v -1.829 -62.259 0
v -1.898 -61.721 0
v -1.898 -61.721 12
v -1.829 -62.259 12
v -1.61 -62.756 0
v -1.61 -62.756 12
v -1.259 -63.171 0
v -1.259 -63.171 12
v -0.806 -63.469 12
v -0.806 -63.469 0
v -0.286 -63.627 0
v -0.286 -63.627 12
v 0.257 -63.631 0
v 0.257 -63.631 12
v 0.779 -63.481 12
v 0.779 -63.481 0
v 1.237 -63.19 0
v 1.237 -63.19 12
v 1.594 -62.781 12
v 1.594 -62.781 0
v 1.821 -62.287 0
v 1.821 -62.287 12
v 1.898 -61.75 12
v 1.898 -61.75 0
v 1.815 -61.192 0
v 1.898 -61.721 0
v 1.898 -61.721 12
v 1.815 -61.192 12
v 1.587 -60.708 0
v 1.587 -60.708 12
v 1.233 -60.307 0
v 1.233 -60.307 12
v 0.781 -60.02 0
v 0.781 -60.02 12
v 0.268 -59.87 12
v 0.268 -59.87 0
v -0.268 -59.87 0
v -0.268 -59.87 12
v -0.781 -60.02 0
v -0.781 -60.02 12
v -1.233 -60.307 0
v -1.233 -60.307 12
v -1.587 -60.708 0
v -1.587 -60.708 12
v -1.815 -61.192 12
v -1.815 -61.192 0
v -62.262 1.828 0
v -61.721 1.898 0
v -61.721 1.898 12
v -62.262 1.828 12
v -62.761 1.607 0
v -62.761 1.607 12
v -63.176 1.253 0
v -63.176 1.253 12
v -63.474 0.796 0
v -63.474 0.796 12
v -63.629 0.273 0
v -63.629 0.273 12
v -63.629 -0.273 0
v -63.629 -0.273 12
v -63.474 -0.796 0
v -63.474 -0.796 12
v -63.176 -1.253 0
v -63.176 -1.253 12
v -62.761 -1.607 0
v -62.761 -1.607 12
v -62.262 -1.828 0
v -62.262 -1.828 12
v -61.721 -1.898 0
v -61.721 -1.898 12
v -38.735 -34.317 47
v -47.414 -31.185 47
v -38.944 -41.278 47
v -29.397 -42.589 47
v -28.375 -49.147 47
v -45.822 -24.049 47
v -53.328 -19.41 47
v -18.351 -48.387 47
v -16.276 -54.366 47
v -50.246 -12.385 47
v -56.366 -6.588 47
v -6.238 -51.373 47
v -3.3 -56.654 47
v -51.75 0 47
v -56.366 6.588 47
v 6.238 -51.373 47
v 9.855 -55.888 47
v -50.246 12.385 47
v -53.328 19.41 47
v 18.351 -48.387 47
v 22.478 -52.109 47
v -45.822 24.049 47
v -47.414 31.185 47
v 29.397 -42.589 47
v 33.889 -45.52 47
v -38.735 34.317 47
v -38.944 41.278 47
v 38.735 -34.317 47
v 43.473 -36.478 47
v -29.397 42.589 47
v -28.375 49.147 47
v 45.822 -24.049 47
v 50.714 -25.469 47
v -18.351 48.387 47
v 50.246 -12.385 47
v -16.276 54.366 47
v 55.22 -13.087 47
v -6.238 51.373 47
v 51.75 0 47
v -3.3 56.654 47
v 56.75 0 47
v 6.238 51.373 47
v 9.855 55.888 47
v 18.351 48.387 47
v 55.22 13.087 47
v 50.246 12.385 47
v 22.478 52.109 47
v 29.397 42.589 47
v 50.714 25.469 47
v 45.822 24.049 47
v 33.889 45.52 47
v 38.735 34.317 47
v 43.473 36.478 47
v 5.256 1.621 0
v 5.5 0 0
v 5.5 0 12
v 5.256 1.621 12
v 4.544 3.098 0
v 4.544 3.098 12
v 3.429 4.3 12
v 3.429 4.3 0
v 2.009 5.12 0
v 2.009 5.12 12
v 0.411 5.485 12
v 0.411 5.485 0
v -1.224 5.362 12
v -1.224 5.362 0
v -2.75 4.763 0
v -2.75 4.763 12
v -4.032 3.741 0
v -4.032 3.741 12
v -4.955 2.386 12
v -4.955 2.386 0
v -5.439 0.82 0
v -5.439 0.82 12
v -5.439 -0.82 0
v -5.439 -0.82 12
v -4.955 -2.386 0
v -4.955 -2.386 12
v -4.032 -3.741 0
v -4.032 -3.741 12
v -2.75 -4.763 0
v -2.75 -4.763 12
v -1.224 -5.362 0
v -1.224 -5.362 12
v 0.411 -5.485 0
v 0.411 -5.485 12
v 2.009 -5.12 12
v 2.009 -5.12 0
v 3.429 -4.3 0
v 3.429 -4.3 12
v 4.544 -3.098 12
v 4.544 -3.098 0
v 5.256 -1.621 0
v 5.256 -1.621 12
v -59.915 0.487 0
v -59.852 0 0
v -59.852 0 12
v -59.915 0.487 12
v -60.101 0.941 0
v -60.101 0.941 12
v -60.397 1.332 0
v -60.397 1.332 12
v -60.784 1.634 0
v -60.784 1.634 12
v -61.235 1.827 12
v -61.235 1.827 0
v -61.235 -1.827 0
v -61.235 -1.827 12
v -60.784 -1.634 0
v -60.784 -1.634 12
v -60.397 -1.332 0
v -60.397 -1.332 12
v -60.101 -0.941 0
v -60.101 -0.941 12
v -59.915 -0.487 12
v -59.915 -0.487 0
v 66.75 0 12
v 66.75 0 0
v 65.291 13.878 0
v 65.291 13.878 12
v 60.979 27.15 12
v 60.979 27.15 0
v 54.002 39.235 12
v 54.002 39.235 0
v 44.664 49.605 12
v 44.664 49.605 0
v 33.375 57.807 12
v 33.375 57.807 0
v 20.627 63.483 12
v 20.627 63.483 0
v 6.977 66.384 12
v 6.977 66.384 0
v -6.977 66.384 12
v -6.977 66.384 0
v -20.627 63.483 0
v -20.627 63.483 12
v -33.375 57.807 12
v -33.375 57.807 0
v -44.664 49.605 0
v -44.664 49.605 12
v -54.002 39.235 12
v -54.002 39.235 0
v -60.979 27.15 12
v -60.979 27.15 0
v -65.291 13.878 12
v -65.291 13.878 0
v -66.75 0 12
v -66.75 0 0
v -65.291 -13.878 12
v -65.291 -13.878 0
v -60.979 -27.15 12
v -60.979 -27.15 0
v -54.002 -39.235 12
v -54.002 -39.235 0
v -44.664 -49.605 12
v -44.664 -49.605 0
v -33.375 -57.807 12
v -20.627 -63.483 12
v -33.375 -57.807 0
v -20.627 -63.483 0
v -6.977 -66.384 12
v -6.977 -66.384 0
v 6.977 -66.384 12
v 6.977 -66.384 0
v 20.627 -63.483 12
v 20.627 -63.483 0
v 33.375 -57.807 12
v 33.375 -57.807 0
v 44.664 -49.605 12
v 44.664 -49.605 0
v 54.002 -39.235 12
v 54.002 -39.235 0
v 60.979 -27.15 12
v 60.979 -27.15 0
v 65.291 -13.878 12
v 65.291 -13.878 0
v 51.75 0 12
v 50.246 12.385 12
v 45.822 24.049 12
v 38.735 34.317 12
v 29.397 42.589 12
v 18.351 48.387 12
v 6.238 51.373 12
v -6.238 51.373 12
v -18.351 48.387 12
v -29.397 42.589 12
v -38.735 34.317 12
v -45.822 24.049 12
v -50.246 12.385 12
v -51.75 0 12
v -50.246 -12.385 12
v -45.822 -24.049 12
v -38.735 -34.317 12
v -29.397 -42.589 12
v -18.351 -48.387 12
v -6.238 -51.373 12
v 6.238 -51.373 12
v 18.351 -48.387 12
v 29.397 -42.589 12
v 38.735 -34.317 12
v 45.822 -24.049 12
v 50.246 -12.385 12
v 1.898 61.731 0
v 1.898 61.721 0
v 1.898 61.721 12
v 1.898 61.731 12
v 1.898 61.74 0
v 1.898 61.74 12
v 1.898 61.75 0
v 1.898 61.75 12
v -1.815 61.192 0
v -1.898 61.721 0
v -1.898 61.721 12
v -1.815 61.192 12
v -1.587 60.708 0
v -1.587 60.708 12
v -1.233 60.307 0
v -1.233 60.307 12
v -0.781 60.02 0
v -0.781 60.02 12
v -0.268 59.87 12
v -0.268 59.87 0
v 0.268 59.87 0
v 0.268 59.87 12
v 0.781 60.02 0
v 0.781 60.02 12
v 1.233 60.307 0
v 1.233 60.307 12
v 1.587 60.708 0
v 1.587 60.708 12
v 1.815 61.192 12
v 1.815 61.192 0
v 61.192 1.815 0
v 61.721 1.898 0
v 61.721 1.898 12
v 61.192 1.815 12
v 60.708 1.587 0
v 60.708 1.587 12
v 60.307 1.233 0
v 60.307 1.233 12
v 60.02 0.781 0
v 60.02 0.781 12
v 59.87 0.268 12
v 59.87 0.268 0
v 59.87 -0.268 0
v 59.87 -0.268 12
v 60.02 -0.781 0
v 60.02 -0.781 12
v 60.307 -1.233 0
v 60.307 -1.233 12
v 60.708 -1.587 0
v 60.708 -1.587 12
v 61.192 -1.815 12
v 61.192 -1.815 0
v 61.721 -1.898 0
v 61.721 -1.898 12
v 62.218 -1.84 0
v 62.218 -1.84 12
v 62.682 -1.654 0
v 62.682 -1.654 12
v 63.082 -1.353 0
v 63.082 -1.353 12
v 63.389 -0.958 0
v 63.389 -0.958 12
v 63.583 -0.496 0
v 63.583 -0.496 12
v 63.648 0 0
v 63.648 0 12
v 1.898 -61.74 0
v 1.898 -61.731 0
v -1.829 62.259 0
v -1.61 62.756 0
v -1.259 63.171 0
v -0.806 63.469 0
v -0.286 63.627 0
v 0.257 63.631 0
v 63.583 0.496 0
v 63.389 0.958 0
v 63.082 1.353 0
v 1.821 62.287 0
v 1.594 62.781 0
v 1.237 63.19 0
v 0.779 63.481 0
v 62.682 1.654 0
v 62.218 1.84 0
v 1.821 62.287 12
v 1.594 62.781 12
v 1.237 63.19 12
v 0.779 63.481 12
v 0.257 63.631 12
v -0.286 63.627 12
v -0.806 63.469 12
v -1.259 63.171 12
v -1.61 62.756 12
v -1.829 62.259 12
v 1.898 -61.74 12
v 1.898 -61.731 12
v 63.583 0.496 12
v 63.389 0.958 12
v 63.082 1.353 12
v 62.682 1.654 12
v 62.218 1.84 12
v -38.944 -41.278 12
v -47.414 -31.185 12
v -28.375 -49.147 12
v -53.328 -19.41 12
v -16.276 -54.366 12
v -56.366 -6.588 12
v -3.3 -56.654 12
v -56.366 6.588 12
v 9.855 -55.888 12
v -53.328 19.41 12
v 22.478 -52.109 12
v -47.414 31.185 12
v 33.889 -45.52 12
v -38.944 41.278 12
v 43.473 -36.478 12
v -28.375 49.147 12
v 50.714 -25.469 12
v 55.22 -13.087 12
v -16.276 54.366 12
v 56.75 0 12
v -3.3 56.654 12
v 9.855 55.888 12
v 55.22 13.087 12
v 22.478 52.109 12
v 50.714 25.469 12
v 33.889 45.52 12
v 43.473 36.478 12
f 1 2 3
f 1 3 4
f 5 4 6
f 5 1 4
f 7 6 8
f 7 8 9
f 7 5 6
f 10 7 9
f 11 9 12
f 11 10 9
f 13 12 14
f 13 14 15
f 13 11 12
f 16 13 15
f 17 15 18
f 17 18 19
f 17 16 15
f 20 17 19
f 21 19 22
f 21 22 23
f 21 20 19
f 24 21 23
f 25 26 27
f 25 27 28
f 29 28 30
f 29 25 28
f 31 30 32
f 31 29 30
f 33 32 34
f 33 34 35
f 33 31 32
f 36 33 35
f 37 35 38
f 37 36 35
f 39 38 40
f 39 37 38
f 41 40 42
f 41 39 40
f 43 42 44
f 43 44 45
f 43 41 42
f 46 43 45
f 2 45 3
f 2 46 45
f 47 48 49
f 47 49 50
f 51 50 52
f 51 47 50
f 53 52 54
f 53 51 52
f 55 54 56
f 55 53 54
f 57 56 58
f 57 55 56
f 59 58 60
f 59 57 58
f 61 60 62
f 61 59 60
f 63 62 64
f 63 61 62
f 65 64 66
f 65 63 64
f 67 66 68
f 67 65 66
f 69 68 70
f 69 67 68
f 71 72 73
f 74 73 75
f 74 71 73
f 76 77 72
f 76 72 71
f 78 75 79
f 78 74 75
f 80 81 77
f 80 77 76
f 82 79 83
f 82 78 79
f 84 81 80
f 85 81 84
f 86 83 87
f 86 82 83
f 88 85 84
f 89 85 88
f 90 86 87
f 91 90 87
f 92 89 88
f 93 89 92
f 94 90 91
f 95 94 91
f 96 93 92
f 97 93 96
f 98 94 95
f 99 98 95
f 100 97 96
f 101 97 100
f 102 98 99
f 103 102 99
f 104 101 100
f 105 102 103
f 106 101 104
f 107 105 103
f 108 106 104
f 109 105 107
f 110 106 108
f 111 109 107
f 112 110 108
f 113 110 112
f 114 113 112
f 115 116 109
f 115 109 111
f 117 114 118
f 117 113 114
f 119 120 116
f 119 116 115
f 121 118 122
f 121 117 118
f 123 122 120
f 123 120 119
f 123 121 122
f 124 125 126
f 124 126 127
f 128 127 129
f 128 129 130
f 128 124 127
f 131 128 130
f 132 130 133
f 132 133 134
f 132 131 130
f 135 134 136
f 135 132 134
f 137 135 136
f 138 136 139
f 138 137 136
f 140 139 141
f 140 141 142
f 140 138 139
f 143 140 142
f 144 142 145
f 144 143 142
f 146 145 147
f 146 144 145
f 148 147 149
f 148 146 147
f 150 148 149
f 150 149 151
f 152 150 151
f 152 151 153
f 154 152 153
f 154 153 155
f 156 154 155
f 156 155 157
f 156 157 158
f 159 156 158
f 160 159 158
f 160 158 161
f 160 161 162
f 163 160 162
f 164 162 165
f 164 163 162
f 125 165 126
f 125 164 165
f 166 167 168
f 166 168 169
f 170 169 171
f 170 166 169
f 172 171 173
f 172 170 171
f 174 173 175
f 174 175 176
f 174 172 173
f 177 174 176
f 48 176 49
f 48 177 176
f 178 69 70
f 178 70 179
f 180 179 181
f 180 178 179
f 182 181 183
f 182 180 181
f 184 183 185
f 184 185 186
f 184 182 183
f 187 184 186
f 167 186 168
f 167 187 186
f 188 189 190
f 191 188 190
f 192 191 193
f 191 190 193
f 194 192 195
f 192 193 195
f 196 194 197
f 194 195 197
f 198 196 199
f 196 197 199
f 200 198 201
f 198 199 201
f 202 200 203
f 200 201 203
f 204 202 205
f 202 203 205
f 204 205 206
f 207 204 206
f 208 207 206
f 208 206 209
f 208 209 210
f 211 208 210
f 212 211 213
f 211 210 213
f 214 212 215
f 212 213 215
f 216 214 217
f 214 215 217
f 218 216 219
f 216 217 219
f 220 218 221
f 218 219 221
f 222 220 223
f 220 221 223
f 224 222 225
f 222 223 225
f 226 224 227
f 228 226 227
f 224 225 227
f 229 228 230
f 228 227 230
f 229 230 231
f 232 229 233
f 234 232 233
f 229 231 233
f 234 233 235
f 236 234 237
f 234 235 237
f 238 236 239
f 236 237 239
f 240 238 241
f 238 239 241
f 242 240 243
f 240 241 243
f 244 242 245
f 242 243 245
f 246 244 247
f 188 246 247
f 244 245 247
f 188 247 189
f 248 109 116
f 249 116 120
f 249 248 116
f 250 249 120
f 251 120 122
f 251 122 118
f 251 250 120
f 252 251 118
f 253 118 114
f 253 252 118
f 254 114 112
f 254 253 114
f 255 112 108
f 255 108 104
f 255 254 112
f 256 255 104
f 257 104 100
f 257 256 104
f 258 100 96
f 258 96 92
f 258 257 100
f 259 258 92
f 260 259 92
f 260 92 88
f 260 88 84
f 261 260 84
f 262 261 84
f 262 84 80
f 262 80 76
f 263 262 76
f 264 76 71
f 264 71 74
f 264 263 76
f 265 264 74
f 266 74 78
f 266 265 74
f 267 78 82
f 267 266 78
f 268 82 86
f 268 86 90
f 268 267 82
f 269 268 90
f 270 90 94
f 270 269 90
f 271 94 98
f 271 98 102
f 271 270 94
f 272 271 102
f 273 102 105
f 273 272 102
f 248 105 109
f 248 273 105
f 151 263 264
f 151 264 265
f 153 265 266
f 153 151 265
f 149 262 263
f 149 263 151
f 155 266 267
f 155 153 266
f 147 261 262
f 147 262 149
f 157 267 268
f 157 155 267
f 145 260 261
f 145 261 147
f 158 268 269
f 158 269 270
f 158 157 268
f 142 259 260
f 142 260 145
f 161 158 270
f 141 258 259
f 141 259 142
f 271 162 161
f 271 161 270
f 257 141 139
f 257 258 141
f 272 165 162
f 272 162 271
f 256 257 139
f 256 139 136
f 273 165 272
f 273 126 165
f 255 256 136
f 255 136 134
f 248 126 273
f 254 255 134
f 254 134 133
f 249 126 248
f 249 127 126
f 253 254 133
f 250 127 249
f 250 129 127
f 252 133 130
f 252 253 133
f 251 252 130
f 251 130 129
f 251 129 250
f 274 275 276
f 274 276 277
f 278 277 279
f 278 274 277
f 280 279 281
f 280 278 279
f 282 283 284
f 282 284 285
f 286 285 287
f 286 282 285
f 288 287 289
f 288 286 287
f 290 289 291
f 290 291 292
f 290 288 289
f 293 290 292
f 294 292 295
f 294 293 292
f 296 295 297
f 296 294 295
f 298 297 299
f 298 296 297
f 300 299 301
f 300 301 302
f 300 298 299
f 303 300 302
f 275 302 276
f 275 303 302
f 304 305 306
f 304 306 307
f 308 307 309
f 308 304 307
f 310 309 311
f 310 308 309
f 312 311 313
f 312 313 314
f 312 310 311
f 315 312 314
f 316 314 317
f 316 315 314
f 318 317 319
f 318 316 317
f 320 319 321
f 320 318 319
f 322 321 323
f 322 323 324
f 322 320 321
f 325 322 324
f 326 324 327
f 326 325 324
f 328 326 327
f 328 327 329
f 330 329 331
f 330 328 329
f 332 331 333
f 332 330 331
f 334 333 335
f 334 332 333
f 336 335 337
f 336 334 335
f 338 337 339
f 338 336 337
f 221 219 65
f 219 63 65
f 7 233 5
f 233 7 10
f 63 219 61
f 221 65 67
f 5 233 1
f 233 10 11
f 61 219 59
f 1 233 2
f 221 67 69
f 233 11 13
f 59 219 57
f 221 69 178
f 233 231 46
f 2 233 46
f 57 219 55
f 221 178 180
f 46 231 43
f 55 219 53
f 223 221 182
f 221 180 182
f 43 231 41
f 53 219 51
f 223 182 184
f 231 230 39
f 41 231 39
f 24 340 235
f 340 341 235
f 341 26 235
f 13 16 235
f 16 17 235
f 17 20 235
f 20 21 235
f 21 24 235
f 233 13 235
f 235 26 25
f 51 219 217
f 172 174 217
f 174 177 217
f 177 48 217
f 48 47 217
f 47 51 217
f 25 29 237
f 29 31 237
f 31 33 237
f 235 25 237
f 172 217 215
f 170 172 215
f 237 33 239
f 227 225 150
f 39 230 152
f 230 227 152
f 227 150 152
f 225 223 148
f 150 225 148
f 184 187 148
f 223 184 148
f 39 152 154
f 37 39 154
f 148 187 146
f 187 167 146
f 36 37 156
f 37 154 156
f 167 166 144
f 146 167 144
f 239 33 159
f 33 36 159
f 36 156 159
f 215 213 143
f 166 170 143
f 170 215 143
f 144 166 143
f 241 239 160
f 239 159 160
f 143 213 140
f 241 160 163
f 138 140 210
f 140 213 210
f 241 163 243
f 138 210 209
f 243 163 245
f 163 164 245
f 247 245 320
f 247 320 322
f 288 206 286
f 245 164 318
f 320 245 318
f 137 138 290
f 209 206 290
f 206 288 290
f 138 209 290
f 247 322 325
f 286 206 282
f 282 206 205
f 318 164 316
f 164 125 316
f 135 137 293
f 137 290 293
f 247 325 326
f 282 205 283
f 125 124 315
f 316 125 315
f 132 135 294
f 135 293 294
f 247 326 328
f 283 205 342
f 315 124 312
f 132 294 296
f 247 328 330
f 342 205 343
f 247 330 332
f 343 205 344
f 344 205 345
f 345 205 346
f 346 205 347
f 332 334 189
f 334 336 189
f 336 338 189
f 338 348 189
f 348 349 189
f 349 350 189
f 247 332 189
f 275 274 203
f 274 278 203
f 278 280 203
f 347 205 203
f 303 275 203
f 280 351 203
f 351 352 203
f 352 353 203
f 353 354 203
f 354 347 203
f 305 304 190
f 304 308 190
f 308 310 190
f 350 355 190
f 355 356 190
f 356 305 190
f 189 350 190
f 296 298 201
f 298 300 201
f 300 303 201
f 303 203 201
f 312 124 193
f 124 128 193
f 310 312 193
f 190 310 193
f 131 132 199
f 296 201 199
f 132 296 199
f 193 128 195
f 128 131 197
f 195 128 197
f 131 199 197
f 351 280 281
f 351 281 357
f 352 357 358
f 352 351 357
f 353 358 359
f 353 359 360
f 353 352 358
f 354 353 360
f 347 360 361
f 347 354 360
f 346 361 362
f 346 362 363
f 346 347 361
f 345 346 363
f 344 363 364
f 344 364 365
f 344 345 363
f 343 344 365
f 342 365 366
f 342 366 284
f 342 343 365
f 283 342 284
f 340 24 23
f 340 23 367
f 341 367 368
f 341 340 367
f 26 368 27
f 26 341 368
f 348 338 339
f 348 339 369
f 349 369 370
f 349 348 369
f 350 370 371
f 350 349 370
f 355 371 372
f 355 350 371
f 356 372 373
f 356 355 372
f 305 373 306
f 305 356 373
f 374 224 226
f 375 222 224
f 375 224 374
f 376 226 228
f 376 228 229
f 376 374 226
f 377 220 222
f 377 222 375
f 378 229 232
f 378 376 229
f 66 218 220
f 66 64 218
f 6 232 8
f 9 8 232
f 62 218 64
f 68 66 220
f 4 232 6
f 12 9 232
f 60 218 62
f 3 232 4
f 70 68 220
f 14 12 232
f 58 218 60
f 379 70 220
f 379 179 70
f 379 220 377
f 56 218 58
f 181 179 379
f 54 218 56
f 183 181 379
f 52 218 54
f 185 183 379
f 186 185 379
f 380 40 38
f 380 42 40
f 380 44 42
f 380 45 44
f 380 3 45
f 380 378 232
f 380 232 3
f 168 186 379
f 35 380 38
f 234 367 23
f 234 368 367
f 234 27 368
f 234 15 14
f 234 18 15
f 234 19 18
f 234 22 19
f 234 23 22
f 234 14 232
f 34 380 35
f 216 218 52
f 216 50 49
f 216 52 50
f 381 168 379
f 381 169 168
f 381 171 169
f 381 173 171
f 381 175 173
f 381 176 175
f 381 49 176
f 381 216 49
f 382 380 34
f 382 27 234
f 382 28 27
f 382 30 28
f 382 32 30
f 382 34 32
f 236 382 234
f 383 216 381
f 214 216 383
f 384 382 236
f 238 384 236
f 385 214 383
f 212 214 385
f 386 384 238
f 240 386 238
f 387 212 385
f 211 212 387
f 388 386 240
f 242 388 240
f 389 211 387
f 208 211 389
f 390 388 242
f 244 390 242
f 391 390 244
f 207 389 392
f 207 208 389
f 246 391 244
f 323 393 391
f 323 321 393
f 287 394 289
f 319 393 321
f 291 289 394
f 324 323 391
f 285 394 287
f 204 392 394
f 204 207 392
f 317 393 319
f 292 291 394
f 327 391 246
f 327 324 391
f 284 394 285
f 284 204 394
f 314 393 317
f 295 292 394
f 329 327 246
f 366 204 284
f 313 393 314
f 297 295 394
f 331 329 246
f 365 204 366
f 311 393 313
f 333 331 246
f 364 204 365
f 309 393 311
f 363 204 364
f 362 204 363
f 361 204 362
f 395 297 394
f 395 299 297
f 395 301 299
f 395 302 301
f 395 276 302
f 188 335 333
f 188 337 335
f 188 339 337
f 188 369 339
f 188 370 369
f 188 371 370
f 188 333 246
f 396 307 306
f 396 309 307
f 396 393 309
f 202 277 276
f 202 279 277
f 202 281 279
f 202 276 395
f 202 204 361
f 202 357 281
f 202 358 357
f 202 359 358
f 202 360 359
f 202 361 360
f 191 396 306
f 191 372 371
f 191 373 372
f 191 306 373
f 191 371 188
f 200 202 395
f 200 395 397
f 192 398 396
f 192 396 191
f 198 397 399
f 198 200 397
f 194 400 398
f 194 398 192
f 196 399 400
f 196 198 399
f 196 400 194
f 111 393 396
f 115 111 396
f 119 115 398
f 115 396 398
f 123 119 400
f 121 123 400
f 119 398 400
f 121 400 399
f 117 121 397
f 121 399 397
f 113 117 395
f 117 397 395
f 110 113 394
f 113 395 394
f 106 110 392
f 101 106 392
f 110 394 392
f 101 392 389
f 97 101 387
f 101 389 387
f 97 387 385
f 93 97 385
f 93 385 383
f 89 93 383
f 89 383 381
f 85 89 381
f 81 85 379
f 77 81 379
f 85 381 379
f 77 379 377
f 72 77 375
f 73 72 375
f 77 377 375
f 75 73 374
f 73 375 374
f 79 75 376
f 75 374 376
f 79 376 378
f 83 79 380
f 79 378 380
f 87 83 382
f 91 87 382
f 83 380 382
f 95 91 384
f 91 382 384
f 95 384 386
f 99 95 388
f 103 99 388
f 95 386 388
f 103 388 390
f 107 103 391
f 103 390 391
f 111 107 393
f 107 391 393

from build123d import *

# Parameters (mm, degrees)
F0_R     = 66.75
F1_DEPTH = 12
F2_R     = 56.75
F2_R_2   = 51.75
F3_DEPTH = 35
F6_DEPTH = 12
F7_R     = 5.5
F8_DEPTH = 12


with BuildPart() as f1:
    # F0 (on Top) → F1 (new body)
    with BuildSketch(Plane.XY):
        Circle(F0_R)
    extrude(amount=F1_DEPTH)

    # F2 (on face) → F3 (join)
    with BuildSketch(Plane.XY.offset(12)):
        Circle(F2_R)
        Circle(F2_R_2, mode=Mode.SUBTRACT)
    extrude(amount=F3_DEPTH)

    # F5 (on Top) → F6 (cut)
    with BuildSketch(Plane.XY):
        with BuildLine():
            ThreePointArc((-1.8982756668, 61.7208153664), (0, 59.8515), (1.8982756668, 61.7208153664))
            ThreePointArc((1.8982756668, 61.7208153664), (0, 61.75), (-1.8982756668, 61.7208153664))
        make_face()
        with BuildLine():
            ThreePointArc((-1.8982756668, 61.7208153664), (0, 61.75), (1.8982756668, 61.7208153664))
            ThreePointArc((1.8982756668, 61.7208153664), (1.8984439159, 61.7354072521), (1.8985, 61.75))
            ThreePointArc((1.8985, 61.75), (-0.0145927479, 63.6484439159), (-1.8982756668, 61.7208153664))
        make_face()
        with BuildLine():
            ThreePointArc((61.7208153664, 1.8982756668), (61.7427034105, 0.94925), (61.75, 0))
            ThreePointArc((61.75, 0), (61.7427034105, -0.94925), (61.7208153664, -1.8982756668))
            ThreePointArc((61.7208153664, -1.8982756668), (63.0820839356, -1.3527211976), (63.6485, 0))
            ThreePointArc((63.6485, 0), (63.0820839356, 1.3527211976), (61.7208153664, 1.8982756668))
        make_face()
        with BuildLine():
            ThreePointArc((61.7208153664, -1.8982756668), (61.7427034105, -0.94925), (61.75, 0))
            ThreePointArc((61.75, 0), (61.7427034105, 0.94925), (61.7208153664, 1.8982756668))
            ThreePointArc((61.7208153664, 1.8982756668), (59.8515, 0), (61.7208153664, -1.8982756668))
        make_face()
        with BuildLine():
            ThreePointArc((1.8985, -61.75), (1.8984439159, -61.7354072521), (1.8982756668, -61.7208153664))
            ThreePointArc((1.8982756668, -61.7208153664), (0, -61.75), (-1.8982756668, -61.7208153664))
            ThreePointArc((-1.8982756668, -61.7208153664), (-0.0145927479, -63.6484439159), (1.8985, -61.75))
        make_face()
        with BuildLine():
            ThreePointArc((-1.8982756668, -61.7208153664), (0, -61.75), (1.8982756668, -61.7208153664))
            ThreePointArc((1.8982756668, -61.7208153664), (0, -59.8515), (-1.8982756668, -61.7208153664))
        make_face()
        with BuildLine():
            ThreePointArc((-59.8515, 0), (-60.3972788024, 1.3320839356), (-61.7208153664, 1.8982756668))
            ThreePointArc((-61.7208153664, 1.8982756668), (-61.75, 0), (-61.7208153664, -1.8982756668))
            ThreePointArc((-61.7208153664, -1.8982756668), (-60.3972788024, -1.3320839356), (-59.8515, 0))
        make_face()
        with BuildLine():
            ThreePointArc((-61.7208153664, -1.8982756668), (-61.75, 0), (-61.7208153664, 1.8982756668))
            ThreePointArc((-61.7208153664, 1.8982756668), (-63.6485, 0), (-61.7208153664, -1.8982756668))
        make_face()
    extrude(amount=F6_DEPTH, mode=Mode.SUBTRACT)

    # F7 (on Top) → F8 (cut)
    with BuildSketch(Plane.XY):
        Circle(F7_R)
    extrude(amount=F8_DEPTH, mode=Mode.SUBTRACT)


solid = f1.part
